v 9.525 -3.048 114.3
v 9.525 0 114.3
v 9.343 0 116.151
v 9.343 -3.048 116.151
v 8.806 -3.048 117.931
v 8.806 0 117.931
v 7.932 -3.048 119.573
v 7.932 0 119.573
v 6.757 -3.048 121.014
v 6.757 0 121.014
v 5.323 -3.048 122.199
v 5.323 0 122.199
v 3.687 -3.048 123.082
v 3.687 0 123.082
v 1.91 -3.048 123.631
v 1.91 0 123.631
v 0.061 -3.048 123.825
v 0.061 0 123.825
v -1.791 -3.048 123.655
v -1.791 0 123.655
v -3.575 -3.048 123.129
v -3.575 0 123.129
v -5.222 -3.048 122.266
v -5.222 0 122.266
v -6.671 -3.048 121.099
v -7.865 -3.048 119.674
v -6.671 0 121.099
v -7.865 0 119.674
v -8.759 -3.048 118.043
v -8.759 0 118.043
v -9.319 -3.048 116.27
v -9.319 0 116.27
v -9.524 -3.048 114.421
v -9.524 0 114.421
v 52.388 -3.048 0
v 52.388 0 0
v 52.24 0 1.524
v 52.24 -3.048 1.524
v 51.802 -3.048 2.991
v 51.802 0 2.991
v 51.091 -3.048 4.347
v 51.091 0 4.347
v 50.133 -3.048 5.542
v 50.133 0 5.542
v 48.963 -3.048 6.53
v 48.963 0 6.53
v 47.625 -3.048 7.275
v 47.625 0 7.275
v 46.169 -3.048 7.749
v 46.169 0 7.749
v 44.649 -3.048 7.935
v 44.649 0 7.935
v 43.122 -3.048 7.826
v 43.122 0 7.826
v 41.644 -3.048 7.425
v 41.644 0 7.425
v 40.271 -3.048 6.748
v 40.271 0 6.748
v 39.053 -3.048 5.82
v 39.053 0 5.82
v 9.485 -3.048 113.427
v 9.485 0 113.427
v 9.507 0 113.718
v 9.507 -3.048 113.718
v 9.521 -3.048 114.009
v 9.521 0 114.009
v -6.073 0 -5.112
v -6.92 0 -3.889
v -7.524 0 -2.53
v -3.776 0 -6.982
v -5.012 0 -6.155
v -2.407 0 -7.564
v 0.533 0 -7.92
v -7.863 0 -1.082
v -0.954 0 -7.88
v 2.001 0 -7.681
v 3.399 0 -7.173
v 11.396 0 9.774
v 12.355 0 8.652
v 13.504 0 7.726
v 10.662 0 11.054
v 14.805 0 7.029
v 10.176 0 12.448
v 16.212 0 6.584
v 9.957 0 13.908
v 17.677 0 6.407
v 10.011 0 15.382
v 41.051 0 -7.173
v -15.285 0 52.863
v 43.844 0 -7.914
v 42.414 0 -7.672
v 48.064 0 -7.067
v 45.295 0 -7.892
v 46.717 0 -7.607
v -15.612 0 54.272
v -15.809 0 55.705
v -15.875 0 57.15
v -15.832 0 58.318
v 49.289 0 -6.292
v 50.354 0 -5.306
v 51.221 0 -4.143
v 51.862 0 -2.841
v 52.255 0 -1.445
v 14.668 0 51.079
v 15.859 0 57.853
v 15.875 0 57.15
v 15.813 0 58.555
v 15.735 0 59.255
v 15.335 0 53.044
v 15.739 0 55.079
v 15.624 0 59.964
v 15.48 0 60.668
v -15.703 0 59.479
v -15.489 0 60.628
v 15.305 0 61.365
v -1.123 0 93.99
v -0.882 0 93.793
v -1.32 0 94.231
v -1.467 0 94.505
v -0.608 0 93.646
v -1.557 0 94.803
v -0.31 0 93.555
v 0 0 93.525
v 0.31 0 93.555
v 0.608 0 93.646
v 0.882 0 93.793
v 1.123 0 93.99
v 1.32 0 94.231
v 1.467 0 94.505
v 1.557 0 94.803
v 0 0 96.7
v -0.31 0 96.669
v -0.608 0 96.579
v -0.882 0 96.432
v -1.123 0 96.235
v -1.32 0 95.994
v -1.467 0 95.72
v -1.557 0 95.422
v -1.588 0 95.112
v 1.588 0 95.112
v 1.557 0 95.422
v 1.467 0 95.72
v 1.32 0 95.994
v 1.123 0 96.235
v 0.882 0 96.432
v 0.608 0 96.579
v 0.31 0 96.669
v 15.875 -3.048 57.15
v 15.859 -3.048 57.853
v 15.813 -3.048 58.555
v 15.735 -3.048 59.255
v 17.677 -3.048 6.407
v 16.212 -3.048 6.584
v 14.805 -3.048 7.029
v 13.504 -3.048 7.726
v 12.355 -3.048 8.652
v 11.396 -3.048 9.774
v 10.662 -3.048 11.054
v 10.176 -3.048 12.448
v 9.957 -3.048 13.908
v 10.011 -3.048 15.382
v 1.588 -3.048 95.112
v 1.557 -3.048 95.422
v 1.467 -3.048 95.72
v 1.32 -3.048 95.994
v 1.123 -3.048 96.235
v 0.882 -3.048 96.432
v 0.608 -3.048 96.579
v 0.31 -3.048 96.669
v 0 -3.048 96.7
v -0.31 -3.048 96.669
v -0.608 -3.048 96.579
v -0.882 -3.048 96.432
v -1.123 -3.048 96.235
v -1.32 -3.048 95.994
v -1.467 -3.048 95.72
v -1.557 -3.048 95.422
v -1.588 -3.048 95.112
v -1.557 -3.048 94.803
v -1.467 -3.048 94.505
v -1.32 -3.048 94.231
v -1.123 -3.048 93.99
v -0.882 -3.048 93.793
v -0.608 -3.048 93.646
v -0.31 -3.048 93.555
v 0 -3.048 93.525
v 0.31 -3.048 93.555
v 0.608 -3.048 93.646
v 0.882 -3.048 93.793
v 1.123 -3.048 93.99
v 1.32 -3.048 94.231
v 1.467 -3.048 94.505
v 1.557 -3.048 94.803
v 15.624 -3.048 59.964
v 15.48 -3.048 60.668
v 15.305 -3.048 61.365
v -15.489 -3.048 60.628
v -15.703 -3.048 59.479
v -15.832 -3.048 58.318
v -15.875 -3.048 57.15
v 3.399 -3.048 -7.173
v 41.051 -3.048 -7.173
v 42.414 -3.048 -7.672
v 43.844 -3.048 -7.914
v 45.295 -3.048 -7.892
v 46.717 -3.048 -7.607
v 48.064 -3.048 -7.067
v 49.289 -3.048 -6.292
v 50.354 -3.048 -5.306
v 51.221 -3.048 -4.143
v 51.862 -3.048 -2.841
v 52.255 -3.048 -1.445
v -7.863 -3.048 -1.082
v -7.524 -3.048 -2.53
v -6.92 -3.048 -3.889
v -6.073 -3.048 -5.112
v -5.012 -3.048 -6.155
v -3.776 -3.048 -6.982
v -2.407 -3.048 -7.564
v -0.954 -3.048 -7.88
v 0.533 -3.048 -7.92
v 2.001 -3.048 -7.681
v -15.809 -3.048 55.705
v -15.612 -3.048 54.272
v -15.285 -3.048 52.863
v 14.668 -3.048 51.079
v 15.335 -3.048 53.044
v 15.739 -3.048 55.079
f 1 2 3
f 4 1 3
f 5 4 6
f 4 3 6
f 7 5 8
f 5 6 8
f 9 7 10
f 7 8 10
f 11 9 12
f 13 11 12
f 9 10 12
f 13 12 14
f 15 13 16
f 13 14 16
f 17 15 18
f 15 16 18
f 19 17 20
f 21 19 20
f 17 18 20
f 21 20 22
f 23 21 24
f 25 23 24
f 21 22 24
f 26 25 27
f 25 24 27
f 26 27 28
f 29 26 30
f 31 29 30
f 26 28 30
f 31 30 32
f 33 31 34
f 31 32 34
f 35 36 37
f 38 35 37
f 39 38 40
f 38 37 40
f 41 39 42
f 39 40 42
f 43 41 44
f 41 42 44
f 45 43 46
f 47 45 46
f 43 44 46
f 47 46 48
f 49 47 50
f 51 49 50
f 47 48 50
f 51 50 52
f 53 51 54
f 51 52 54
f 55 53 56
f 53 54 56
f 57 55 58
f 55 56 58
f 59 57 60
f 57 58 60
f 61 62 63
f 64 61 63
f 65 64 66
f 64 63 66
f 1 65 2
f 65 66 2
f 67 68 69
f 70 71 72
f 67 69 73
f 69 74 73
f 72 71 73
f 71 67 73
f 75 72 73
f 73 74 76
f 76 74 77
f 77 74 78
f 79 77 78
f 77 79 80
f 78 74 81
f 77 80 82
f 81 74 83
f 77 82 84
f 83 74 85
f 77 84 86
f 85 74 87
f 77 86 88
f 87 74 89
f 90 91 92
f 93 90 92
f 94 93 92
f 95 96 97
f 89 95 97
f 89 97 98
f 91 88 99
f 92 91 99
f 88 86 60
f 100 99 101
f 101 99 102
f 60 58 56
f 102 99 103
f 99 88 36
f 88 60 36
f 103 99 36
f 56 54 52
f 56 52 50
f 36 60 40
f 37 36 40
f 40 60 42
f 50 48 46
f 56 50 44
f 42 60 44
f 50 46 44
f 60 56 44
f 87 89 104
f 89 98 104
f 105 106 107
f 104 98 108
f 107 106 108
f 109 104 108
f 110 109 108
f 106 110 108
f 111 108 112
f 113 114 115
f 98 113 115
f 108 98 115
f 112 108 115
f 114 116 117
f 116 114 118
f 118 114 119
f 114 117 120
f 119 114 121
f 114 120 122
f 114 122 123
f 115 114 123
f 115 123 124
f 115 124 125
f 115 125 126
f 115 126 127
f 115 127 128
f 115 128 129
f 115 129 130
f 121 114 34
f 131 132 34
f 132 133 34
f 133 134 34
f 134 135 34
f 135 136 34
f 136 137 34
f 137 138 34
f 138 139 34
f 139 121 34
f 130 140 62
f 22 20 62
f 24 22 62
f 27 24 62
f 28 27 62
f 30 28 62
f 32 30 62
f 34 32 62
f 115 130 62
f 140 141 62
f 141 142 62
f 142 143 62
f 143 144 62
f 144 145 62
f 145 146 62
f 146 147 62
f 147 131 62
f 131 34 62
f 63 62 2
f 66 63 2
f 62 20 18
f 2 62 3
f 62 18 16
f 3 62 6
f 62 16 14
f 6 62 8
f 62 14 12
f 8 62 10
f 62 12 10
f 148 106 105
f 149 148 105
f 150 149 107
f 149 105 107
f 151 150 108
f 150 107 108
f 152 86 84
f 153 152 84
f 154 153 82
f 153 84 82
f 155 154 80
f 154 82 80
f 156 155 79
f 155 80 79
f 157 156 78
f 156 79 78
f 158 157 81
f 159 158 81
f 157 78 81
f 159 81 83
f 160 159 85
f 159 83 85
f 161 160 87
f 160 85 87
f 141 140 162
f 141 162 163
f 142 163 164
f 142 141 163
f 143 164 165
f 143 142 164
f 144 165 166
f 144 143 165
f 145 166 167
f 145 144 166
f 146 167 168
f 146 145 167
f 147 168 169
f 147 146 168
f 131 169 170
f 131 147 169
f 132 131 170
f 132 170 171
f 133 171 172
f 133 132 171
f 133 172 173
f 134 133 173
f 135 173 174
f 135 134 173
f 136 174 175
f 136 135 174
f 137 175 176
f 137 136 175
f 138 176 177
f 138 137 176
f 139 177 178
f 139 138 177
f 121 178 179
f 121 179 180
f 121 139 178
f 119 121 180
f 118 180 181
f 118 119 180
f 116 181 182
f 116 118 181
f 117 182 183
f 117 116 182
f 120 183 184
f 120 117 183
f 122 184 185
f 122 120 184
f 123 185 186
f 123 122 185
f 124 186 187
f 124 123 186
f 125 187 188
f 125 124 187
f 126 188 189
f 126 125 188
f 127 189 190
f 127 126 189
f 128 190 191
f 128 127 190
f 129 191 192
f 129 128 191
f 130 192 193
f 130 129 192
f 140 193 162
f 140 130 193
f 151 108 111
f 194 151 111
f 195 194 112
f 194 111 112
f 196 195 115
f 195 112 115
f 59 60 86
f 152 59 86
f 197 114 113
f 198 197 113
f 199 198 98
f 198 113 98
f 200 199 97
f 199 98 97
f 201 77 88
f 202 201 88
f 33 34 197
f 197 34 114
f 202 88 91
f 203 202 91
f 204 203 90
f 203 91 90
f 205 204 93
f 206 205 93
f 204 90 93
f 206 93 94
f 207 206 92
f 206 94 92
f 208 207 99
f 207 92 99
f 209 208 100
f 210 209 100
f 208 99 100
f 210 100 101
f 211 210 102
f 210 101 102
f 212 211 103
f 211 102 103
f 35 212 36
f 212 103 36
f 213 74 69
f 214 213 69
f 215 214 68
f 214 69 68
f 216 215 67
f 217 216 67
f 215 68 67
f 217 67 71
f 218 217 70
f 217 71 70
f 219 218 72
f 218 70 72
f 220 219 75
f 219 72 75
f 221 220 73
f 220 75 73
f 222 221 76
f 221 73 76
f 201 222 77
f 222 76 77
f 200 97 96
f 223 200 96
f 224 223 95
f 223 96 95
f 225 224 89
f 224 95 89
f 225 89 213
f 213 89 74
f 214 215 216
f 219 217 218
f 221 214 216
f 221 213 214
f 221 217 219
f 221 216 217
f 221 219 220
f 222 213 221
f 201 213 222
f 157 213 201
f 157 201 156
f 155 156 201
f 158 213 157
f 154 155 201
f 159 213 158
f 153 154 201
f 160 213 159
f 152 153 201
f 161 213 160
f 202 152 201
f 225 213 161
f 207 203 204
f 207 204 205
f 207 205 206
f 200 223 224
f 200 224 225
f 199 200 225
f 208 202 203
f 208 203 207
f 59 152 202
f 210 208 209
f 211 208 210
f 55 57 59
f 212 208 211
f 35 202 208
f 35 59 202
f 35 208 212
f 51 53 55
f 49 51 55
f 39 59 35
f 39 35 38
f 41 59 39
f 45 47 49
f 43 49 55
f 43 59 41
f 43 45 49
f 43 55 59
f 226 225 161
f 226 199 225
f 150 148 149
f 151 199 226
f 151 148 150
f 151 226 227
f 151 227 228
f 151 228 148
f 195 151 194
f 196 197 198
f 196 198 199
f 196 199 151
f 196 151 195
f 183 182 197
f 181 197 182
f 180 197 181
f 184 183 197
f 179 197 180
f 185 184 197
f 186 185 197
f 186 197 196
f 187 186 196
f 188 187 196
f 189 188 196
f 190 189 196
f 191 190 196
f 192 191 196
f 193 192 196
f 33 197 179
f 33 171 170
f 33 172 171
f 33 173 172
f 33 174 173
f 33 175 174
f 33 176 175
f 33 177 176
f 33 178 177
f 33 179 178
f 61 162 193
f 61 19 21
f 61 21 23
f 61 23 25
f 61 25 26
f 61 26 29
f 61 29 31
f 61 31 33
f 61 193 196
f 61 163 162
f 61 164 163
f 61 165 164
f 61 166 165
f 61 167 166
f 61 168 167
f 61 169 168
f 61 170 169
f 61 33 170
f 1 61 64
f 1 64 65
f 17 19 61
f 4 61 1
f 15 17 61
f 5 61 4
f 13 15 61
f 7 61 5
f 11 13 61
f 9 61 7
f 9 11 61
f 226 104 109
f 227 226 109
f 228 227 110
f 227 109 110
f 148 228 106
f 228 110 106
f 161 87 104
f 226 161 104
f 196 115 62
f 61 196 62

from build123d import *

# Parameters (mm, degrees)
F0_R     = 1.5875
F1_DEPTH = 3.048


with BuildPart() as f1:
    # F0 (on Front) → F1 (new body)
    with BuildSketch(Plane.XZ):
        with BuildLine():
            ThreePointArc((9.48492, 113.427124), (9.514975, 113.863102), (9.525, 114.3))
            ThreePointArc((9.525, 114.3), (0.060685, 123.824807), (-9.524227, 114.421367))
            ThreePointArc((-9.524227, 114.421367), (-0.497509, 104.788002), (9.48492, 113.427124))
        make_face()
        with BuildLine():
            ThreePointArc((9.48492, 113.427124), (-0.497509, 104.788002), (-9.524227, 114.421367))
            Line((-9.524227, 114.421367), (-15.489332, 60.627964))
            ThreePointArc((-15.489332, 60.627964), (-0.379702, 73.020458), (15.305283, 61.364727))
            Line((15.305283, 61.364727), (9.48492, 113.427124))
        make_face()
        with Locations((0, 95.112495)):
            Circle(F0_R, mode=Mode.SUBTRACT)
        with BuildLine():
            Line((-15.875, 57.15), (-15.489332, 60.627964))
            ThreePointArc((-15.489332, 60.627964), (-15.778288, 58.899641), (-15.875, 57.15))
        make_face()
        with BuildLine():
            ThreePointArc((15.305283, 61.364727), (-0.379702, 73.020458), (-15.489332, 60.627964))
            Line((-15.489332, 60.627964), (-15.875, 57.15))
            Line((-15.875, 57.15), (-15.285187, 52.862963))
            ThreePointArc((-15.285187, 52.862963), (-0.943722, 41.303076), (14.668351, 51.07916))
            Line((14.668351, 51.07916), (15.734881, 59.25455))
            ThreePointArc((15.734881, 59.25455), (15.555905, 60.316931), (15.305283, 61.364727))
        make_face()
        with BuildLine():
            Line((-15.285187, 52.862963), (-15.875, 57.15))
            ThreePointArc((-15.875, 57.15), (-15.726856, 54.98629), (-15.285187, 52.862963))
        make_face()
        with BuildLine():
            ThreePointArc((15.875, 57.15), (15.839932, 58.204605), (15.734881, 59.25455))
            Line((15.734881, 59.25455), (14.668351, 51.07916))
            ThreePointArc((14.668351, 51.07916), (15.570416, 54.055202), (15.875, 57.15))
        make_face()
        with BuildLine():
            ThreePointArc((14.668351, 51.07916), (-0.943722, 41.303076), (-15.285187, 52.862963))
            Line((-15.285187, 52.862963), (-7.863428, -1.081855))
            ThreePointArc((-7.863428, -1.081855), (-0.542194, 7.91896), (7.9375, 0))
            ThreePointArc((7.9375, 0), (6.707453, -4.244288), (3.398545, -7.17313))
            Line((3.398545, -7.17313), (41.051455, -7.17313))
            ThreePointArc((41.051455, -7.17313), (36.604764, -1.20672), (39.052875, 5.820219))
            Line((39.052875, 5.820219), (17.676814, 6.4068))
            ThreePointArc((17.676814, 6.4068), (11.849313, 9.191003), (10.011494, 15.382447))
            Line((10.011494, 15.382447), (14.668351, 51.07916))
        make_face()
        with BuildLine():
            ThreePointArc((7.9375, 0), (-0.542194, 7.91896), (-7.863428, -1.081855))
            ThreePointArc((-7.863428, -1.081855), (-3.776202, -6.981705), (3.398545, -7.17313))
            ThreePointArc((3.398545, -7.17313), (6.707453, -4.244288), (7.9375, 0))
        make_face()
        with BuildLine():
            ThreePointArc((39.052875, 5.820219), (36.604764, -1.20672), (41.051455, -7.17313))
            ThreePointArc((41.051455, -7.17313), (48.694288, -6.707453), (52.3875, 0))
            ThreePointArc((52.3875, 0), (47.625234, 7.274737), (39.052875, 5.820219))
        make_face()
    extrude(amount=F1_DEPTH)


solid = f1.part
